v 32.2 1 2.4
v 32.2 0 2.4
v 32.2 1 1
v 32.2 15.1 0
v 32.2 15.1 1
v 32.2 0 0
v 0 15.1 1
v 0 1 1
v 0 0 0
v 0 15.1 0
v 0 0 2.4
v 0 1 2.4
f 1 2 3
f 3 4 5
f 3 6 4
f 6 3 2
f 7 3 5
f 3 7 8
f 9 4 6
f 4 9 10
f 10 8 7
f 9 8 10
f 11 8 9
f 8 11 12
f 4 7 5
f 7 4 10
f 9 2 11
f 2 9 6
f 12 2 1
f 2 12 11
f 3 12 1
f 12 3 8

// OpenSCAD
// arduino pro micro and four 8x8 dot-matrix led display

//micro usb
usb_height=2.7;
usb_width=9.0;
arduino_length=33.5 + 1.6*2 /* mount */;
arduino_offset_x=2.0; // required because of dot-matrix display connector is in the way

pcb_width=32.2;
pcb_length=130 + arduino_length;
pcb_height=1.6;

inner_height=2.5; // height on top of pcb
inner_height_below=10; // height below pcb
bottom=1.0; // bottom layer thickness

sides=1.0; //mm thickness

enable_pcb_slide_in=0;
enable_pcb_mount=1; // extra pcb mounting rail
enable_cover_rim=1;
enable_led_hole=1;

led_diameter=5.1;

side_diff=0.7; // pcb slide-in in mm

extra_length=1;

width=pcb_width + 2*sides - (enable_pcb_slide_in==1 ? 2*side_diff : 0);
inner_width = pcb_width - (enable_pcb_slide_in==1 ? 2*side_diff : 0);
length=pcb_length + 2*sides - side_diff + extra_length;//extra
inner_length= pcb_length + 1*sides - side_diff + extra_length;
height=bottom+pcb_height+inner_height+sides+inner_height_below;

part=4; // 1=main case, 2=only arduino holder, 3=cover, 4=back cover
e=0.01;
enable_air_flow=0;

module arduino_mount(board="micro", width=18, length=33.5, pcb=1.8, preview=1, height=5, holder_width=3, enable_back_slide=1, tolerance=0.2, center=true) {
  inward=2;
  thick=holder_width;
  top=3;
  offset_x=center==true ? width/2 : 0;
  translate([offset_x,thick/2,0]){
    difference() {
      union() {
        //front holder:
        translate([inward, -thick/2, 0]) cube([thick, thick/2-tolerance, height+top]);
        translate([width-inward-thick, -thick/2, 0]) cube([thick, thick/2-tolerance, height+top]);
        translate([inward, -thick/2, height+pcb]) cube([thick, thick, top/3]);
        translate([width-inward-thick, -thick/2, height+pcb]) cube([thick, thick, top/3]);
        //middle
        translate([width/2-thick, -thick/2, 0]) cube([thick*2, thick, height+pcb]);
        
        //left side:
        translate([-thick/2, +thick, 0]) cube([thick/2, thick, height+pcb-e]);
        translate([-thick/2, length-thick-thick, 0]) cube([thick/2, thick, height+pcb-e]);
        //right side:
        translate([width, +thick, 0]) cube([thick/2, thick, height+pcb-e]);
        translate([width, length-thick-thick, 0]) cube([thick/2, thick, height+pcb-e]);
        
        //backside slide in (where the usb connector is):
        if(enable_back_slide==1) {
          translate([-thick/2, length-thick/2, 0]) cube([thick, thick, height+top]);
          translate([width-thick/2, length-thick/2, 0]) cube([thick, thick, height+top]);
        }
      }
    
      color([0.5,1,0.5]) translate([-tolerance,-tolerance,height]) cube([width+2*tolerance, length+2*tolerance, pcb+tolerance]);
      top_extra=0.25;
      translate([inward-e, -thick/2, height+top+top_extra]) rotate([-28,0,0]) cube([thick+2*e, thick*3, height+top]);
      translate([width-inward-thick-e, -thick/2, height+top+top_extra]) rotate([-28,0,0]) cube([thick+3*e, thick*3, height+top]);
    }
    if(preview==1)
      color([0.5,1,0.5]) translate([0,0,height]) cube([width, length, pcb]);
  }
}


module print_stand_mount() {
  // stand:
  stand_at=15;
  stand_width=3;
  translate([-e,stand_at, height-bottom/2]) color([1,0,0]) cube([width+2*e, stand_width, bottom]); 
  translate([-e,length - stand_at, height-bottom/2]) color([1,0,0]) cube([width+2*e, stand_width, bottom]); 
}


if(part==4) { // back Cover
  cover_width=width-2*sides;
  cover_height=height-sides;
  top=2.4;
  cube([cover_width, cover_height, sides]);
  translate([0,0,0]) cube([cover_width, sides, top]);
}


if(part==3) { // Cover
  inward=sides;
  cover_length=36.5-0.25;
  cover_width=width-2*sides;
  clips=4;
  clip_height=sides*2;
  clip_length=2;
  clip_thick=3;
  clip_dist=(cover_length - 2*inward - clip_length*2)/(clips-1);
  union() {
    cube([cover_width, cover_length, sides]);
    
    for(i=[0 : 1 : clips-1]) color([0,1,0]) {
      translate([0,i*clip_dist,0]) difference() {
        union() {
          translate([sides, inward, sides-e]) cube([clip_thick, clip_length, clip_height]);
          
          translate([cover_width-sides-clip_thick, inward, sides-e]) cube([clip_thick, clip_length, clip_height]);
        }
      
        translate([sides, inward-e, 2*sides]) rotate([-90,0,0]) cylinder(r=sides, h=clip_length+2*e, $fn=32);
        translate([cover_width-sides, inward-e, 2*sides]) rotate([-90,0,0]) cylinder(r=sides, h=clip_length+2*e, $fn=32);
      }
  }
  }
}

if(part==2) {
  arduino_mount();
}

//rotate([0,180,0])
//rotate([0,0,180])
translate([0,-length/2,0])
if(part==1) {
  
  translate([width+arduino_offset_x,length-arduino_length,height]) rotate([0,180,0]) arduino_mount(preview=0);
  
  if(enable_pcb_mount==1) {
    into=sides+side_diff;
    mount_width=2.5;
    mount_height=inner_height+e;
    mounts=5;
    tolerance=0.01;
    spacing = (inner_length - arduino_length - 10*into) / (mounts-1);
    for(i=[0:1:mounts-1]) {
      translate([sides, into+i*spacing, bottom + inner_height_below+pcb_height]) cube([mount_width, mount_width, mount_height]);
      translate([width-sides-mount_width, into+i*spacing, bottom + inner_height_below+pcb_height]) cube([mount_width, mount_width, mount_height]);
    }
    
    //top for slidein
    translate([0,0,-mount_height-pcb_height-tolerance]) for(i=[0:1:mounts-1]) {
      translate([sides, into+i*spacing, bottom + inner_height_below+pcb_height]) difference() {
        cube([mount_width, mount_width, mount_height]);
        
        translate([-sides,-e,mount_height]) rotate([0,20,0]) cube([mount_width*2, mount_width+2*e, mount_height]);
      }
      translate([width-sides-mount_width, into+i*spacing, bottom + inner_height_below+pcb_height]) { 
        rotate([0,0,180]) translate([-mount_width,-mount_width,0]) difference() {
          cube([mount_width, mount_width, mount_height]);
          translate([0,-e, mount_height]) rotate([0,20,0]) cube([mount_width*2, mount_width+2*e, mount_height]);
        } 

      }
    }
  }
  
  // rim for holding arduino cover
  if(enable_cover_rim==1) color([0,1,0]) {
    translate([sides,length-2*sides, sides]) cube([sides,sides,sides]);
    translate([sides,length-arduino_length,sides*2])  {
      translate([0,0,-sides]) cube([sides,sides,sides]);
      rotate([180+90,0,0])  cylinder(r=sides, h=arduino_length, $fn=32);
    }
    translate([width-2*sides,length-2*sides, sides]) cube([sides,sides,sides]);
    translate([width-sides,length-arduino_length,sides*2]) {
      translate([-sides,0,-sides]) cube([sides,sides,sides]);
      rotate([180+90,0,0]) cylinder(r=sides, h=arduino_length, $fn=32);
    }
  }
  
  if(part==1)difference() {

    union() {
      cube([width, length, height]);
      
      
    }
    
    // main inner hull
    translate([sides, -e, -e]) cube([inner_width, inner_length+e, sides + pcb_height + inner_height + inner_height_below]);
    
    // pcb slide ins:
    if(enable_pcb_slide_in==1) {
      translate([sides-side_diff, -e, bottom + inner_height_below]) cube([pcb_width, inner_length+side_diff+2*e, pcb_height]);
    }
    
    
    // usb connector:
    translate([width/2-sides/2-usb_width/2+arduino_offset_x, length-sides-side_diff-e, bottom + inner_height_below]) cube([usb_width, 2*sides, usb_height+pcb_height]);
    
    /*
    translate([width-sides-17, length-1-e, bottom+pcb_height+3*bottom]) {
    rotate([-90,0,0]) color([1,1,0.5])
      linear_extrude(2)
              text("OUT", size=8, halign="center",valign="top",font="Freesans:style=Bold", spacing=1);
    }
    */
    
    print_stand_mount();
    
    // front door slide in
    translate([sides-(enable_pcb_slide_in==1?side_diff:side_diff/2), sides, -e]) color([0,1,0])
      cube([width-2*sides+ (enable_pcb_slide_in==1?2*side_diff:side_diff), side_diff, height-sides+side_diff]);
    
    // air flow
    if(enable_air_flow==1) {
      translate([-e, sides+extra_length+10, bottom+pcb_height+2]) {
        wi=2;
        cnt=10;
        for(i=[0:1:cnt+1]) {
          translate([0,i*3*wi, 0]) cube([sides+e, wi, height/2]);
        }
      }
    }
    
    if(enable_led_hole==1) {
      translate([-e, length - arduino_length/2 - sides, height/2])
      color([1,0.5,1]) rotate([0,90,0])
      cylinder(r=led_diameter/2, h=sides*2, $fn=32);
    }
  }//difference
  //print_stand();
  
  
  
}
